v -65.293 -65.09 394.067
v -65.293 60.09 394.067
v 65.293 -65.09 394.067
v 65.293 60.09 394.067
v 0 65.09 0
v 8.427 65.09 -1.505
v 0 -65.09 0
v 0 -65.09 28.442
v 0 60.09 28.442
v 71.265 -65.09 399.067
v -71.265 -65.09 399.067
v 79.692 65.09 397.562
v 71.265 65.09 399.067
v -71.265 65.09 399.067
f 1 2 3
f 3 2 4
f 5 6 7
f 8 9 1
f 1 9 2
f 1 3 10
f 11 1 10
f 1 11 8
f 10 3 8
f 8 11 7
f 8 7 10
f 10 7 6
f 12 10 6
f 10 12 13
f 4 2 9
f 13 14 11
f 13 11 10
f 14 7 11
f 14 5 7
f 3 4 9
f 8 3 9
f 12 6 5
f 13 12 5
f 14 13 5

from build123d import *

# Parameters (mm, degrees)
MAIN_BLOCK_EXTRUDE_DEPTH = 65.09
SHELL1_T                 = -5
SLANT_DEPTH              = 405.38


with BuildPart() as part:
    # Sketch1 → Main block extrude (new, symmetric)
    with BuildSketch(Plane(origin=(0, 0, 0), x_dir=(1, 0, 0), z_dir=(0, 1, 0))):
        Polygon((0, 0), (-71.265, -399.066716446), (71.265, -399.066716446), align=None)
    extrude(amount=MAIN_BLOCK_EXTRUDE_DEPTH, both=True)

    # Shell1
    shell1_openings = [part.faces().sort_by_distance(p)[0] for p in [
        (0, -65.09, 266.044477631),
    ]]
    offset(amount=SHELL1_T, openings=shell1_openings, kind=Kind.INTERSECTION)

    # Sketch2 → Slant (add)
    with BuildSketch(Plane(origin=(71.265, 0, 399.066716446), x_dir=(0, -1, 0), z_dir=(0.17579801667571168, 0, 0.9844262579456555))):
        Polygon((-65.09, 0), (65.09, 0), (-65.09, 8.560443406), align=None)
    extrude(amount=-SLANT_DEPTH)


solid = part.part
